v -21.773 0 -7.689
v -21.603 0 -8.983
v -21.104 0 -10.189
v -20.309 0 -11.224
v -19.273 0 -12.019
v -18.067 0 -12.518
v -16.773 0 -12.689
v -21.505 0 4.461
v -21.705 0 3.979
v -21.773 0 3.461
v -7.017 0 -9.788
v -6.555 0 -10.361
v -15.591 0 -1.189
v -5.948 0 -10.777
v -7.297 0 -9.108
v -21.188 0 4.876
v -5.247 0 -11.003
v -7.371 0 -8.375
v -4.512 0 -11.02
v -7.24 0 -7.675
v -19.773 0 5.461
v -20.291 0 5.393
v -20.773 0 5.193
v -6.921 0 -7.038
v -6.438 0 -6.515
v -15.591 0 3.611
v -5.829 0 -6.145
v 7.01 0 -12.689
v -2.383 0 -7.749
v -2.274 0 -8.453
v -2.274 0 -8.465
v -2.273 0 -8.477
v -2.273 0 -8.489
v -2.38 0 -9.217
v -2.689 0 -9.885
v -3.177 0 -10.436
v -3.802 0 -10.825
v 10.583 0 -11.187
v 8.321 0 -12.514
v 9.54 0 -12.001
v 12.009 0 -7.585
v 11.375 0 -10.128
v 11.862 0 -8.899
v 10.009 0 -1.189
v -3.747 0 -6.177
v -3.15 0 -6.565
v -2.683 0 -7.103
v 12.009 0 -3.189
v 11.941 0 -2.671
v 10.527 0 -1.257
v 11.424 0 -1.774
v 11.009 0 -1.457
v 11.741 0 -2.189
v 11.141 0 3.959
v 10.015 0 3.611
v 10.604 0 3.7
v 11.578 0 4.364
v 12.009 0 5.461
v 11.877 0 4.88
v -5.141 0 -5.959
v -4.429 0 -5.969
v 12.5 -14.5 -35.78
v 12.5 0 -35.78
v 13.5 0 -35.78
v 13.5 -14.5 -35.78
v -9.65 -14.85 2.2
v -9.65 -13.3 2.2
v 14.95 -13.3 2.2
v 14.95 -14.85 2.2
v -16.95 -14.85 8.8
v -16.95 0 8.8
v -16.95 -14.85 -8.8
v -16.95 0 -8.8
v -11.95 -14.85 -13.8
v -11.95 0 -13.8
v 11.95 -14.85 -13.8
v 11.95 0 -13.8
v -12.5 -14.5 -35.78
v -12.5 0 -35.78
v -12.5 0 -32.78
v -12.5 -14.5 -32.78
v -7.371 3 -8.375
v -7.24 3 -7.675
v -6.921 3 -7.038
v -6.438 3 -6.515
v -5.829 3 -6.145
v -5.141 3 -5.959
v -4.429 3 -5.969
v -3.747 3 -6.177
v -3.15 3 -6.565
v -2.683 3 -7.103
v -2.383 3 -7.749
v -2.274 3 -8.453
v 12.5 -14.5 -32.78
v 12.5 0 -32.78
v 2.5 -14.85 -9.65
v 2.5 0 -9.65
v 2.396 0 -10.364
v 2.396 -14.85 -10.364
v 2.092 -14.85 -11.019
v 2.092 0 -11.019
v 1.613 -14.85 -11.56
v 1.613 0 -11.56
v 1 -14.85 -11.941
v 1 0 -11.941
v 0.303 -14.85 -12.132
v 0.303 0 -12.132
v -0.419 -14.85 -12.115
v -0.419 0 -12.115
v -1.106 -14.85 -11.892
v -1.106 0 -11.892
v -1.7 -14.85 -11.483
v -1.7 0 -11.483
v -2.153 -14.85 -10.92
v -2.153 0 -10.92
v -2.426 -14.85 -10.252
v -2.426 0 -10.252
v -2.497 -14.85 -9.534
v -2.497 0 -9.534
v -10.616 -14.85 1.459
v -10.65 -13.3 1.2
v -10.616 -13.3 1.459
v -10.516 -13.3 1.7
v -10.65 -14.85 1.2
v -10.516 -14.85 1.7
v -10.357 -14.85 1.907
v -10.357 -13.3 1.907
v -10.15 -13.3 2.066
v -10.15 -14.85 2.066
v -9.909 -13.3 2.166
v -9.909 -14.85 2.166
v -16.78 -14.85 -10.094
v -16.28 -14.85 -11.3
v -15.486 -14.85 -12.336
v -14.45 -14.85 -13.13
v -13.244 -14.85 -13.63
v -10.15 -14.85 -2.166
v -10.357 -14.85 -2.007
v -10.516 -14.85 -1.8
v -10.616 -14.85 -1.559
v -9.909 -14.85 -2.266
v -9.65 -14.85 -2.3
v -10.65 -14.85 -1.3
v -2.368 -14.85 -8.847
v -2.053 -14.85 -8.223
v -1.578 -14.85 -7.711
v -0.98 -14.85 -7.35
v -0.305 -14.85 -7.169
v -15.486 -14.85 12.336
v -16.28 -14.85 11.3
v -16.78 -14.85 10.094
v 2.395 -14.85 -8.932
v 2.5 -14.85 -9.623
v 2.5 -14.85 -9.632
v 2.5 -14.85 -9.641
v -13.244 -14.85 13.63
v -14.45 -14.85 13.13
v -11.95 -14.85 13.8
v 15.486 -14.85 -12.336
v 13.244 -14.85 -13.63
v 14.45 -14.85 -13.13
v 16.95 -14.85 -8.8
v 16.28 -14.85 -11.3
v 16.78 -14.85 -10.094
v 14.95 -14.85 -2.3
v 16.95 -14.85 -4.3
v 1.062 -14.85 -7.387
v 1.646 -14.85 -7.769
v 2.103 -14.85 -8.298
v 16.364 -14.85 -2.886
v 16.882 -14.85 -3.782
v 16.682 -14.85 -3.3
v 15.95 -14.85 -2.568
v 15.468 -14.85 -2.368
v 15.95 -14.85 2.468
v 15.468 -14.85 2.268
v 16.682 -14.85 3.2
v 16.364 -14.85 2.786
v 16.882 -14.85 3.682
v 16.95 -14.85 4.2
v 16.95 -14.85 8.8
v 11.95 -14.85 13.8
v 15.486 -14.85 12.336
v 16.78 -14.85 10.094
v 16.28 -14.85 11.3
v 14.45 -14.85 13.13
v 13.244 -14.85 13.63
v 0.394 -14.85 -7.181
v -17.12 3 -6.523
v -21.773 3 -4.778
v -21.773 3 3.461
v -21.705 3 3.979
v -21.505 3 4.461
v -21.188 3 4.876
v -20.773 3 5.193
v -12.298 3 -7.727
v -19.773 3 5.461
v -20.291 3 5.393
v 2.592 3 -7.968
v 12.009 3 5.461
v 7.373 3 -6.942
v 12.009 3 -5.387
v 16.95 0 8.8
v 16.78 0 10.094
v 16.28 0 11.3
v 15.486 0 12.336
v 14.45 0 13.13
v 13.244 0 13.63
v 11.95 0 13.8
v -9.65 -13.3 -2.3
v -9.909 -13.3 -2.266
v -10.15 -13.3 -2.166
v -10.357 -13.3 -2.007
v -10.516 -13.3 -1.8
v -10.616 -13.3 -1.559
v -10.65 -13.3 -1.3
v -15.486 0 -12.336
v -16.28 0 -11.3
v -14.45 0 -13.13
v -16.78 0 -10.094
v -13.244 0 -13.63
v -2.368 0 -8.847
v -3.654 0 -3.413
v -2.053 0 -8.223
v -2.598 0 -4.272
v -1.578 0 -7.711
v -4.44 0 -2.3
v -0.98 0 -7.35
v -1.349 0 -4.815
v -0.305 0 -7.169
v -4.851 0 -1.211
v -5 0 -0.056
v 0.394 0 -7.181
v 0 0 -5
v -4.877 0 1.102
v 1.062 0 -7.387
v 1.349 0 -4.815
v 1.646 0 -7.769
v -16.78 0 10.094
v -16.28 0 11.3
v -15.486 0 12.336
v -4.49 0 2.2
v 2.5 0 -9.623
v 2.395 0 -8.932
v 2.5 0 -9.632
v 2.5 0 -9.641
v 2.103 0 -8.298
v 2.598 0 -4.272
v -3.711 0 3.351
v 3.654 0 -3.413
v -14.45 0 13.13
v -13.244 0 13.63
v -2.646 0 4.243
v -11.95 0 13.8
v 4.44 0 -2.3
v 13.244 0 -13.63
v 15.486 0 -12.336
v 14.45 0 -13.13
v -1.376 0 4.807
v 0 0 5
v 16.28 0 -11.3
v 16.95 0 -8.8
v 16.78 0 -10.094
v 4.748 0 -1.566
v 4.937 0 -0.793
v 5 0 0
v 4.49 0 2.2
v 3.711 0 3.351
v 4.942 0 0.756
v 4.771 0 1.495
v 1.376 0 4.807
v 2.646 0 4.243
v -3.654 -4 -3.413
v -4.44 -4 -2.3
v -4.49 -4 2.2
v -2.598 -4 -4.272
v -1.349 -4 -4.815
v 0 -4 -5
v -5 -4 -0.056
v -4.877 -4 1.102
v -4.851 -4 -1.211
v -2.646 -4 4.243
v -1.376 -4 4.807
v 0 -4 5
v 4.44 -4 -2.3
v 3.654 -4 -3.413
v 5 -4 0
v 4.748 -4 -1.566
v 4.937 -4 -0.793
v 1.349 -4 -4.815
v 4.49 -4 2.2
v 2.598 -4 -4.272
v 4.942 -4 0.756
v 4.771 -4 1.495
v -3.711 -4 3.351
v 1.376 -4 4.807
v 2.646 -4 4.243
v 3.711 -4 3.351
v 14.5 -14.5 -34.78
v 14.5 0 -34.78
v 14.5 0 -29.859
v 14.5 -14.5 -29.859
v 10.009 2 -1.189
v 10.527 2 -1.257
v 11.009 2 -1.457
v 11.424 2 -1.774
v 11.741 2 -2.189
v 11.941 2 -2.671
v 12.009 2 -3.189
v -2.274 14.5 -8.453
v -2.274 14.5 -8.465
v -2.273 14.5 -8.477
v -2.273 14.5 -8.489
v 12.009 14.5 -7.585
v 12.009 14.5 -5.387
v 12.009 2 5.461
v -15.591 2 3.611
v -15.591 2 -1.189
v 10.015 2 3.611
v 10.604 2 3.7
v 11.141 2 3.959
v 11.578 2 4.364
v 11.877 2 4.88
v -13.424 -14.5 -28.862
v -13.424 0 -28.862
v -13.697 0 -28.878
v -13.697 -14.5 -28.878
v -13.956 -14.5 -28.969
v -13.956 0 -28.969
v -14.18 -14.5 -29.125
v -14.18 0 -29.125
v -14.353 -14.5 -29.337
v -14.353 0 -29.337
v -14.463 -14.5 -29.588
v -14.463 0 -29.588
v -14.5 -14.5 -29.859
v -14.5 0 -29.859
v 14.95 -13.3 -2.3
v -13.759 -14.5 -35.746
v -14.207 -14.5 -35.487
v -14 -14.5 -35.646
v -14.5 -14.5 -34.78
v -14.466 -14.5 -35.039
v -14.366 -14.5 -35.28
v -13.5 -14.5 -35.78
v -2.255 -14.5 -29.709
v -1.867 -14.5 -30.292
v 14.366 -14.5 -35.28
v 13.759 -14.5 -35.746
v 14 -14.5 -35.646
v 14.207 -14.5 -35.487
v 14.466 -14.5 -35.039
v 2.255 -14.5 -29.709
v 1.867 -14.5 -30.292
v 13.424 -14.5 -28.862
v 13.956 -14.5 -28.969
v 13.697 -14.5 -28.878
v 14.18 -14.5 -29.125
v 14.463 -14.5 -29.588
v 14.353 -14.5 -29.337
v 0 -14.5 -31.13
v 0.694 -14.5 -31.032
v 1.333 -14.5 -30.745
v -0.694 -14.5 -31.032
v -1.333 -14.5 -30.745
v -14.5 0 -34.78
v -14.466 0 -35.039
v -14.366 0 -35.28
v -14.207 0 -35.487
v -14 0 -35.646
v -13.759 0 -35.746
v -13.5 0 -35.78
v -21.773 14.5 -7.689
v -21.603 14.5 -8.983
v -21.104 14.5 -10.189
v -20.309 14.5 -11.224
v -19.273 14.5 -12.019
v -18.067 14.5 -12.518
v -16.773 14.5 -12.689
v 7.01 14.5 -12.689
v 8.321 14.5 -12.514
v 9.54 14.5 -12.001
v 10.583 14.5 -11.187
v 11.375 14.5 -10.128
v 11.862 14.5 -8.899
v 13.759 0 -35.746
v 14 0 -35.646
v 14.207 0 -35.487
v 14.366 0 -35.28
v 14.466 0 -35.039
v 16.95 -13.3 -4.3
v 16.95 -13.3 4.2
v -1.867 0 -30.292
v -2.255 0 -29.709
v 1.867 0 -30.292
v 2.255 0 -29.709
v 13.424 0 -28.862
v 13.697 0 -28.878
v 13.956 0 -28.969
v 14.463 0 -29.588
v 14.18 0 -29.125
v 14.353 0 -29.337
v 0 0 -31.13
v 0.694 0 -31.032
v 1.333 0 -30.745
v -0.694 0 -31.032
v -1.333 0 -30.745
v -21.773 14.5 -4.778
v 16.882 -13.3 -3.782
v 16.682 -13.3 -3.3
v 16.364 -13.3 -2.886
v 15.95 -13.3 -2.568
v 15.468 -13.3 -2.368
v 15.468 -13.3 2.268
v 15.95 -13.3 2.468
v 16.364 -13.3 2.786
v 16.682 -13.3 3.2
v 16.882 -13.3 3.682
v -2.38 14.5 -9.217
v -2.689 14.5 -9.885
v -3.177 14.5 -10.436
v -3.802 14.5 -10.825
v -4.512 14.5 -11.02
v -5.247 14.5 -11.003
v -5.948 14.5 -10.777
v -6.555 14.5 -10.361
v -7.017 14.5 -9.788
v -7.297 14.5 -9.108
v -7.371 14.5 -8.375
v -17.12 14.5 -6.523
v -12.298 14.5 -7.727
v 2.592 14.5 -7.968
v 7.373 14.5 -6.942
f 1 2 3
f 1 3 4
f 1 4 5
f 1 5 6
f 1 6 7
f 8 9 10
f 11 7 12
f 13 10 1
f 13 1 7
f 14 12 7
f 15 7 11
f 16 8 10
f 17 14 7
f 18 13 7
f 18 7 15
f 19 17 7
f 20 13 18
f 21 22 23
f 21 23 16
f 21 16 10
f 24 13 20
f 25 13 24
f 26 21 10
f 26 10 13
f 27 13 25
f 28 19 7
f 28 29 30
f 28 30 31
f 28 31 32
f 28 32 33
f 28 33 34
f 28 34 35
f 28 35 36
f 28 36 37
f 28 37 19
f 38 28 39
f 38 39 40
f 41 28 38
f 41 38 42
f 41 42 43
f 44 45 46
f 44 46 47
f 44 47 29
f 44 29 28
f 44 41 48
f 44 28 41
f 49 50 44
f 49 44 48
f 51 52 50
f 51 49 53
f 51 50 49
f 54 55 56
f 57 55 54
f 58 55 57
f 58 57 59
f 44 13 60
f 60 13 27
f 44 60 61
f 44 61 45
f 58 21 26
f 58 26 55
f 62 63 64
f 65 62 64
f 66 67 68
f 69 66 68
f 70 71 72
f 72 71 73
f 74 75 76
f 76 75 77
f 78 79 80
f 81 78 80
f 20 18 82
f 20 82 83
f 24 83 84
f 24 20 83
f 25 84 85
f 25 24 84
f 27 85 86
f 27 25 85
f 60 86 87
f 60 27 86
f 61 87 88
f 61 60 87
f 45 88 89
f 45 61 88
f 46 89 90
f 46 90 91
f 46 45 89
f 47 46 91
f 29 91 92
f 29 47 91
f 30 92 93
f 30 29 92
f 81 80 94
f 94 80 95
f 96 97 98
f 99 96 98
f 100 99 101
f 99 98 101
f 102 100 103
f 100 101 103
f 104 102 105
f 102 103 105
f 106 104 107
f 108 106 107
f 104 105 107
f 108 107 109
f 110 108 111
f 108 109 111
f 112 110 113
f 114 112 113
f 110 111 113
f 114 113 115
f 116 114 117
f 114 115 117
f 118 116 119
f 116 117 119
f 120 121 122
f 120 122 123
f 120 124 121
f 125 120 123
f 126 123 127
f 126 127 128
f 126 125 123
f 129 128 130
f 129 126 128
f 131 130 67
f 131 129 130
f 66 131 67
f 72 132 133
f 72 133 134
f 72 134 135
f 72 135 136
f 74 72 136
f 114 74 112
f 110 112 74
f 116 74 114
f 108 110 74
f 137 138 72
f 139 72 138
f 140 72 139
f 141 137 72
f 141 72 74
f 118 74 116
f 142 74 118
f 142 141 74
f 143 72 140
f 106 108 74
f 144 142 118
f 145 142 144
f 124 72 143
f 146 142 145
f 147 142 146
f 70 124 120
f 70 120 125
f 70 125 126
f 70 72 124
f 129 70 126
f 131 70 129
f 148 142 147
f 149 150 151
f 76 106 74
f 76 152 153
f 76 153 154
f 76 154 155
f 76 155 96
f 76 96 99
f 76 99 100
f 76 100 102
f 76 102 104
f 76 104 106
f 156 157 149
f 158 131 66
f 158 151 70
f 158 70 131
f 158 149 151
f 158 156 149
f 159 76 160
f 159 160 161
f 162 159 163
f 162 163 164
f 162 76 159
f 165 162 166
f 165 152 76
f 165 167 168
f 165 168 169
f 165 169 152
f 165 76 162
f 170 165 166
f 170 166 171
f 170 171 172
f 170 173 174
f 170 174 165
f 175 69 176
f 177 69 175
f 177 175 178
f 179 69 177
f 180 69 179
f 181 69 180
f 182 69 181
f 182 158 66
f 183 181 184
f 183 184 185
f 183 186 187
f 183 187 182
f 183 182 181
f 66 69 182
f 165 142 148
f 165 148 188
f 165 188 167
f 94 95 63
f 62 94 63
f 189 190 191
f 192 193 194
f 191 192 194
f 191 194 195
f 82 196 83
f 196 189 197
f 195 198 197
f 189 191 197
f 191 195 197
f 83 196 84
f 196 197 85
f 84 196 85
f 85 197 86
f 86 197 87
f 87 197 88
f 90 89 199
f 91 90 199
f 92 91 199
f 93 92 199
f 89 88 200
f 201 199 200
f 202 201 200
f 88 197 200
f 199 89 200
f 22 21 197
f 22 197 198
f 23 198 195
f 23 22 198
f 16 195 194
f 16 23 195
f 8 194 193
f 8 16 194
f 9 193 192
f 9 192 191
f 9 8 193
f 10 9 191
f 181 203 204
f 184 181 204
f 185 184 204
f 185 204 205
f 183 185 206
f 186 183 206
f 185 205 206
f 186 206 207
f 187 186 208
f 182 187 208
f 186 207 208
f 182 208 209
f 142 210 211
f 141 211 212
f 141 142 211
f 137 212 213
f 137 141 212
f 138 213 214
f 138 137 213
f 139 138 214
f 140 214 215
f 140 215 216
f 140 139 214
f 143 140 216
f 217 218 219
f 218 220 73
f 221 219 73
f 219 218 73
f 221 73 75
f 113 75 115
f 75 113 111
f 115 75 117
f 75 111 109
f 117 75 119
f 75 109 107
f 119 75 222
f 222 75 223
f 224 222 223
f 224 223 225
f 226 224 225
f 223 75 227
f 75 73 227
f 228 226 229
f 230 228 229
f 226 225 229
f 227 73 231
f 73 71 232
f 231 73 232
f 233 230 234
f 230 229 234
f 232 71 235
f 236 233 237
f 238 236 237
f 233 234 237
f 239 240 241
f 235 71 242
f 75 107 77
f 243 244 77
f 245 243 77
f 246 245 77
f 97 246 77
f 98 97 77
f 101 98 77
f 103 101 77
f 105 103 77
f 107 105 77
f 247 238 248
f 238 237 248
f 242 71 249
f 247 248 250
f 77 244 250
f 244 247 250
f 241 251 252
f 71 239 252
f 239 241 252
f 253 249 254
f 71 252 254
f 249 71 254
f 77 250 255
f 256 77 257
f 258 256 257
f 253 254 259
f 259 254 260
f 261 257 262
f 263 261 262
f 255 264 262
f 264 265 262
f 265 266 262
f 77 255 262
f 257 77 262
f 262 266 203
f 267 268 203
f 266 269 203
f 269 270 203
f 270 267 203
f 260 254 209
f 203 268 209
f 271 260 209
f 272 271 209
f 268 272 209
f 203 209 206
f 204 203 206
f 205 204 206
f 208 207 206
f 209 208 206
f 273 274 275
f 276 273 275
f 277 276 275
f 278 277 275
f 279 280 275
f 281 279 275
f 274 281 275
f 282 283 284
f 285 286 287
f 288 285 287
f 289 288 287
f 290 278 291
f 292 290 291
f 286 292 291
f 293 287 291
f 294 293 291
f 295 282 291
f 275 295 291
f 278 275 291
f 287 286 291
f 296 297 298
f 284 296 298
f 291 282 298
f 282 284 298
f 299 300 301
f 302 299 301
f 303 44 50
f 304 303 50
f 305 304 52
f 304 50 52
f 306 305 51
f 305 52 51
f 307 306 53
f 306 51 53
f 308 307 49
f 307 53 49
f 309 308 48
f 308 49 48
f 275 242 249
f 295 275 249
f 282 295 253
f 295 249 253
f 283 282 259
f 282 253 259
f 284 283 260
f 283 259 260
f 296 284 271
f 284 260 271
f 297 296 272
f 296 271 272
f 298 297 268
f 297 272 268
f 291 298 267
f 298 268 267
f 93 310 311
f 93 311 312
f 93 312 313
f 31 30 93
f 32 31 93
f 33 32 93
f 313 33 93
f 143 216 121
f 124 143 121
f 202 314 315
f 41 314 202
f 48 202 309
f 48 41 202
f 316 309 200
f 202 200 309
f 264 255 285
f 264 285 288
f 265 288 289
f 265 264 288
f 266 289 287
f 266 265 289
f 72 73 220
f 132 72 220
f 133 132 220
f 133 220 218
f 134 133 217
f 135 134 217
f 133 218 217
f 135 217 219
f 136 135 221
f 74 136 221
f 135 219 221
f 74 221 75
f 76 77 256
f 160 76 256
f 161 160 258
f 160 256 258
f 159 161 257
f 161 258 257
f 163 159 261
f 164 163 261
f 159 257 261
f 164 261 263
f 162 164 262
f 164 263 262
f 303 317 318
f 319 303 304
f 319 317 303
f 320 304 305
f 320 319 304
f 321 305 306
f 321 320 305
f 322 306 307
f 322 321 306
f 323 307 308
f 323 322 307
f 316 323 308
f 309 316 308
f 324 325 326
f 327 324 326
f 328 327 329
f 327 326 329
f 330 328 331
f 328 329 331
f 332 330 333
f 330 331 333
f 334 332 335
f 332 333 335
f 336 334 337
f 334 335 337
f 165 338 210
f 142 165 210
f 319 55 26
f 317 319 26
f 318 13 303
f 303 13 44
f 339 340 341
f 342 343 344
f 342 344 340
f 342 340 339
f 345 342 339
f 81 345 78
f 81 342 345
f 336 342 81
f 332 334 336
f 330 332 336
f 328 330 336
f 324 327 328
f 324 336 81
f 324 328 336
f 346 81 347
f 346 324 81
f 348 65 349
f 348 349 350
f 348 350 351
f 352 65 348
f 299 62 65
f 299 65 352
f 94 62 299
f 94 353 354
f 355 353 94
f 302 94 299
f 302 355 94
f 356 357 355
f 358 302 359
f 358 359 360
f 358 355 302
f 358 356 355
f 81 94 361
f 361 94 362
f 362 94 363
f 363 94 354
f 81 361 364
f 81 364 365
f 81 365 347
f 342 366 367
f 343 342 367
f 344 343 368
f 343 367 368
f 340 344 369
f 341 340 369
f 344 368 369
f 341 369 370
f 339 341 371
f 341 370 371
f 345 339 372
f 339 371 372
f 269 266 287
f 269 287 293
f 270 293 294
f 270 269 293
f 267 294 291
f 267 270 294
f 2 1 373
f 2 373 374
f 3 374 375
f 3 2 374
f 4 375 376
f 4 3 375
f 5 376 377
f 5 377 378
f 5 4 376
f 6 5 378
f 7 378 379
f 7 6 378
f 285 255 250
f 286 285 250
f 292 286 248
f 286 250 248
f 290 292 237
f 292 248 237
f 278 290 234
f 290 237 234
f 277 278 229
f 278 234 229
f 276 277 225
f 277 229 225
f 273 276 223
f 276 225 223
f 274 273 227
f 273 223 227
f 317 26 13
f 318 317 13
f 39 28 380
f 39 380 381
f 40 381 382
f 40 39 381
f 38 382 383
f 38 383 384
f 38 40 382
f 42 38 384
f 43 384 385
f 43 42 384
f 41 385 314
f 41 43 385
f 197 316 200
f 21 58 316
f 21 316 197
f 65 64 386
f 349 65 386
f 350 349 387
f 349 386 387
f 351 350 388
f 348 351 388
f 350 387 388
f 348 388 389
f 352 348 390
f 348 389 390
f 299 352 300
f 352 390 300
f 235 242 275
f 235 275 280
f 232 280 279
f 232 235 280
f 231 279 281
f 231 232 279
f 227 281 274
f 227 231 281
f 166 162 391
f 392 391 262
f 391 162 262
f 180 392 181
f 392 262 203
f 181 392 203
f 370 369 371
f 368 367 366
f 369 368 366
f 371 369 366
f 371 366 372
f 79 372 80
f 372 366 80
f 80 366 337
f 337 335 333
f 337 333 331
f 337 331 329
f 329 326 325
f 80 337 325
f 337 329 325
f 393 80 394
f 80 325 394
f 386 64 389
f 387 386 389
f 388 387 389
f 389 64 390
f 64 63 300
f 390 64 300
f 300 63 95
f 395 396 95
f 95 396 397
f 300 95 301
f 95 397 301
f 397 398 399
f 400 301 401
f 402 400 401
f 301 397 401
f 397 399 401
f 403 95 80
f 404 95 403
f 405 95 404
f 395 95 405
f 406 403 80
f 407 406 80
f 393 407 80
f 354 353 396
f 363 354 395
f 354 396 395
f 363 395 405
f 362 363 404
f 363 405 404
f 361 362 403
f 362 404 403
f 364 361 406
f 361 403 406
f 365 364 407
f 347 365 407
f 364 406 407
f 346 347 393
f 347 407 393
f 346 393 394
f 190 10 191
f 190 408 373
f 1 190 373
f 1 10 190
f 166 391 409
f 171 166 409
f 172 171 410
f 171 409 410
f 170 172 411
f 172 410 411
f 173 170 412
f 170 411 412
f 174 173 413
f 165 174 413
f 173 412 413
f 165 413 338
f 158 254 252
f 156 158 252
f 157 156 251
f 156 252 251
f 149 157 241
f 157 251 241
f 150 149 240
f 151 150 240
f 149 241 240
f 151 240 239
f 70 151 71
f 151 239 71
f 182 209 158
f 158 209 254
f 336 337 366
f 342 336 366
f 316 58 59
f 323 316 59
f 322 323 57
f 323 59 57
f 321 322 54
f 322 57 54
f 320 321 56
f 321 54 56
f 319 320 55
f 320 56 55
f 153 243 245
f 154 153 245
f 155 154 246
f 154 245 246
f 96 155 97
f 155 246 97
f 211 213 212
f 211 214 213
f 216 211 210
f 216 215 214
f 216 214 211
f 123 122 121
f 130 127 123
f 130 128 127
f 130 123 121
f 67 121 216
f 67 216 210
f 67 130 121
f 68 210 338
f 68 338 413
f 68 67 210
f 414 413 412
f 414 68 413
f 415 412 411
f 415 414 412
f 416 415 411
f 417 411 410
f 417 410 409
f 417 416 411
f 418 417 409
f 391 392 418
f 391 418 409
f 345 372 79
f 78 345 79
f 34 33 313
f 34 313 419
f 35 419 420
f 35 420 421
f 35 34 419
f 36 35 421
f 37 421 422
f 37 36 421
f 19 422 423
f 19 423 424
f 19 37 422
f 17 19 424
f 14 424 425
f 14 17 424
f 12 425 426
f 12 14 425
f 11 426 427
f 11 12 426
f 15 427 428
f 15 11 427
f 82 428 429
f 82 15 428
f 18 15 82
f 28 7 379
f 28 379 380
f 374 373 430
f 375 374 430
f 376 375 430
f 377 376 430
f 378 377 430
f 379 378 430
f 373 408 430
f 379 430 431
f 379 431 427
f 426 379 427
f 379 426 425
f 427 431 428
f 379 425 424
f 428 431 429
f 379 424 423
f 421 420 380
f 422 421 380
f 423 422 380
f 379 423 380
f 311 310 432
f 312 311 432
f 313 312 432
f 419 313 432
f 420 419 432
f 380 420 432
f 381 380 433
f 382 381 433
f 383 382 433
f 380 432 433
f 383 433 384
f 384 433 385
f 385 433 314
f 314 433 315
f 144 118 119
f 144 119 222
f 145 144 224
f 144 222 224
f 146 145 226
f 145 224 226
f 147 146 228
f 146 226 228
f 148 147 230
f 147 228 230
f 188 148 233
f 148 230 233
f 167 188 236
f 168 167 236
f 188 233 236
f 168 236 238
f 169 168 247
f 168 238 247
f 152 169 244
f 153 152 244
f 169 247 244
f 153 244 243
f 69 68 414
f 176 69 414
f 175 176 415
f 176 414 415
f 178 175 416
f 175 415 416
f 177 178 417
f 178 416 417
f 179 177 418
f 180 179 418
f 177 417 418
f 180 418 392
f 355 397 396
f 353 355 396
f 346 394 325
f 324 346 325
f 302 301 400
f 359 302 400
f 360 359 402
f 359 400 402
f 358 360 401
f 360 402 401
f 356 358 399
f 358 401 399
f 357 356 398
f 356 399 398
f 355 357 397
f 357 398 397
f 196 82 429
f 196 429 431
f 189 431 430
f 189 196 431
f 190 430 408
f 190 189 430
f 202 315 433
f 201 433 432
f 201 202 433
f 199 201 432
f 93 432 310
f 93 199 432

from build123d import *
from build123d import SkipClean  # not in build123d's __all__

# Parameters (mm, degrees)
F1_DEPTH  = 14.85
F2_DEPTH  = 13.3
F3_START  = 4
F3_DEPTH  = 9.3
F4_DEPTH  = 4
F5_START  = 4
F5_DEPTH  = 10.85
F6_R      = 1
F8_DEPTH  = 14.5
F9_DEPTH  = 3
F10_DEPTH = 2
F12_DEPTH = 14.5


with BuildPart() as f1:
    # F0 (on Front) → F1 (new body)
    with BuildSketch(Plane.XZ):
        with BuildLine():
            Line((11.95, 13.8), (-11.95, 13.8))
            ThreePointArc((-11.95, 13.8), (-15.4855339059, 12.3355339059), (-16.95, 8.8))
            Line((-16.95, 8.8), (-16.95, -5.8895261027))
            ThreePointArc((-16.95, -5.8895261027), (-9.8804541895, -8.3334638669), (-2.4972846772, -9.5335129141))
            ThreePointArc((-2.4972846772, -9.5335129141), (0.0448690015, -7.1504026779), (2.4998564985, -9.6232140564))
            ThreePointArc((2.4998564985, -9.6232140564), (9.8559923461, -8.7028657635), (16.95, -6.55))
            Line((16.95, -6.55), (16.95, -4.3))
            ThreePointArc((16.95, -4.3), (16.3642135624, -2.8857864376), (14.95, -2.3))
            Line((14.95, -2.3), (4.4395945761, -2.3))
            ThreePointArc((4.4395945761, -2.3), (0, -5), (-4.4395945761, -2.3))
            Line((-4.4395945761, -2.3), (-10.65, -2.3))
            Line((-10.65, -2.3), (-10.65, 2.2))
            Line((-10.65, 2.2), (-4.4899888641, 2.2))
            ThreePointArc((-4.4899888641, 2.2), (0, 5), (4.4899888641, 2.2))
            Line((4.4899888641, 2.2), (14.95, 2.2))
            ThreePointArc((14.95, 2.2), (16.3642135624, 2.7857864376), (16.95, 4.2))
            Line((16.95, 4.2), (16.95, 8.8))
            ThreePointArc((16.95, 8.8), (15.4855339059, 12.3355339059), (11.95, 13.8))
        make_face()
        with BuildLine():
            ThreePointArc((-2.4972846772, -9.5335129141), (-9.8804541895, -8.3334638669), (-16.95, -5.8895261027))
            Line((-16.95, -5.8895261027), (-16.95, -8.8))
            ThreePointArc((-16.95, -8.8), (-15.4855339059, -12.3355339059), (-11.95, -13.8))
            Line((-11.95, -13.8), (11.95, -13.8))
            ThreePointArc((11.95, -13.8), (15.4855339059, -12.3355339059), (16.95, -8.8))
            Line((16.95, -8.8), (16.95, -6.55))
            ThreePointArc((16.95, -6.55), (9.8559923461, -8.7028657635), (2.4998564985, -9.6232140564))
            ThreePointArc((2.4998564985, -9.6232140564), (2.4999641244, -9.636606836), (2.5, -9.65))
            ThreePointArc((2.5, -9.65), (-0.0582593644, -12.1493210771), (-2.4972846772, -9.5335129141))
        make_face()
    extrude(amount=F1_DEPTH)

    # F0 (on Front) → F2 (join)
    with BuildSketch(Plane.XZ):
        with BuildLine():
            ThreePointArc((-4.4395945761, -2.3), (-4.9996865006, -0.0559901426), (-4.4899888641, 2.2))
            Line((-4.4899888641, 2.2), (-10.65, 2.2))
            Line((-10.65, 2.2), (-10.65, -2.3))
            Line((-10.65, -2.3), (-4.4395945761, -2.3))
        make_face()
        with BuildLine():
            ThreePointArc((5, 0), (4.8708286934, 1.1291713066), (4.4899888641, 2.2))
            Line((4.4899888641, 2.2), (-4.4899888641, 2.2))
            ThreePointArc((-4.4899888641, 2.2), (-4.9996865006, -0.0559901426), (-4.4395945761, -2.3))
            Line((-4.4395945761, -2.3), (4.4395945761, -2.3))
            ThreePointArc((4.4395945761, -2.3), (4.8578788005, -1.1836441863), (5, 0))
        make_face()
        with BuildLine():
            Line((16.95, 2.2), (16.95, 4.2))
            ThreePointArc((16.95, 4.2), (16.3642135624, 2.7857864376), (14.95, 2.2))
            Line((14.95, 2.2), (4.4899888641, 2.2))
            ThreePointArc((4.4899888641, 2.2), (4.8708286934, 1.1291713066), (5, 0))
            ThreePointArc((5, 0), (4.8578788005, -1.1836441863), (4.4395945761, -2.3))
            Line((4.4395945761, -2.3), (14.95, -2.3))
            ThreePointArc((14.95, -2.3), (16.3642135624, -2.8857864376), (16.95, -4.3))
            Line((16.95, -4.3), (16.95, -2.3))
            Line((16.95, -2.3), (16.95, 2.2))
        make_face()
    extrude(amount=F2_DEPTH)

    # F0 (on Front) → F3 (join)
    with BuildSketch(Plane.XZ.offset(F3_START)):
        with BuildLine():
            Line((-4.4899888641, 2.2), (4.4899888641, 2.2))
            ThreePointArc((4.4899888641, 2.2), (0, 5), (-4.4899888641, 2.2))
        make_face()
        with BuildLine():
            Line((4.4395945761, -2.3), (-4.4395945761, -2.3))
            ThreePointArc((-4.4395945761, -2.3), (0, -5), (4.4395945761, -2.3))
        make_face()
        with BuildLine():
            ThreePointArc((5, 0), (4.8708286934, 1.1291713066), (4.4899888641, 2.2))
            Line((4.4899888641, 2.2), (-4.4899888641, 2.2))
            ThreePointArc((-4.4899888641, 2.2), (-4.9996865006, -0.0559901426), (-4.4395945761, -2.3))
            Line((-4.4395945761, -2.3), (4.4395945761, -2.3))
            ThreePointArc((4.4395945761, -2.3), (4.8578788005, -1.1836441863), (5, 0))
        make_face()
    extrude(amount=F3_DEPTH)

    # F0 (on Front) → F4 (cut)
    with BuildSketch(Plane.XZ):
        with BuildLine():
            ThreePointArc((5, 0), (4.8708286934, 1.1291713066), (4.4899888641, 2.2))
            Line((4.4899888641, 2.2), (-4.4899888641, 2.2))
            ThreePointArc((-4.4899888641, 2.2), (-4.9996865006, -0.0559901426), (-4.4395945761, -2.3))
            Line((-4.4395945761, -2.3), (4.4395945761, -2.3))
            ThreePointArc((4.4395945761, -2.3), (4.8578788005, -1.1836441863), (5, 0))
        make_face()
    with SkipClean():  # cleaning this boolean's faces spoils the solid; the shape is the same uncleaned
        extrude(amount=F4_DEPTH, mode=Mode.SUBTRACT)

    # F0 (on Front) → F5 (join)
    with BuildSketch(Plane.XZ.offset(F5_START)):
        with BuildLine():
            Line((-4.4899888641, 2.2), (4.4899888641, 2.2))
            ThreePointArc((4.4899888641, 2.2), (0, 5), (-4.4899888641, 2.2))
        make_face()
        with BuildLine():
            Line((4.4395945761, -2.3), (-4.4395945761, -2.3))
            ThreePointArc((-4.4395945761, -2.3), (0, -5), (4.4395945761, -2.3))
        make_face()
    with SkipClean():  # cleaning this boolean's faces spoils the solid; the shape is the same uncleaned
        extrude(amount=F5_DEPTH)

    # F6
    f6_edges = [f1.edges().sort_by_distance(p)[0] for p in [
        (-10.65, -14.075, 2.2),
        (-10.65, -14.075, -2.3),
    ]]
    fillet(f6_edges, radius=F6_R)


with BuildPart() as f8:
    # F7 (on Front) → F8 (new body)
    with BuildSketch(Plane.XZ):
        with BuildLine():
            ThreePointArc((-21.773402003, -7.6886942186), (-20.308935909, -11.2242281245), (-16.773402003, -12.6886942186))
            Line((-16.773402003, -12.6886942186), (7.0104826284, -12.6886942186))
            ThreePointArc((7.0104826284, -12.6886942186), (10.5825591861, -11.187303809), (12.0094031494, -7.584801845))
            Line((12.0094031494, -7.584801845), (12.0094031494, -5.3867480318))
            ThreePointArc((12.0094031494, -5.3867480318), (4.9971655581, -7.5221412361), (-2.2736510197, -8.4530582387))
            ThreePointArc((-2.2736510197, -8.4530582387), (-2.273464258, -8.4708757937), (-2.273402003, -8.4886942186))
            ThreePointArc((-2.273402003, -8.4886942186), (-4.8801320097, -11.0380631025), (-7.3708778511, -8.3752622863))
            ThreePointArc((-7.3708778511, -8.3752622863), (-14.7262981055, -7.1939892841), (-21.773402003, -4.7782203213))
            Line((-21.773402003, -4.7782203213), (-21.773402003, -7.6886942186))
        make_face()
    extrude(amount=-F8_DEPTH)

    # F7 (on Front) → F9 (join)
    with BuildSketch(Plane.XZ):
        with BuildLine():
            Line((-21.773402003, 3.4613057814), (-21.773402003, -4.7782203213))
            ThreePointArc((-21.773402003, -4.7782203213), (-14.7262981055, -7.1939892841), (-7.3708778511, -8.3752622863))
            ThreePointArc((-7.3708778511, -8.3752622863), (-4.7844873963, -5.9389911666), (-2.2736510197, -8.4530582387))
            ThreePointArc((-2.2736510197, -8.4530582387), (4.9971655581, -7.5221412361), (12.0094031494, -5.3867480318))
            Line((12.0094031494, -5.3867480318), (12.0094031494, -3.1886942186))
            ThreePointArc((12.0094031494, -3.1886942186), (11.4236167118, -1.7744806562), (10.0094031494, -1.1886942186))
            Line((10.0094031494, -1.1886942186), (-15.5905968506, -1.1886942186))
            Line((-15.5905968506, -1.1886942186), (-15.5905968506, 3.6113057814))
            Line((-15.5905968506, 3.6113057814), (10.0150360819, 3.6113057814))
            ThreePointArc((10.0150360819, 3.6113057814), (11.3751831327, 4.1450179515), (12.0094031494, 5.4613057814))
            Line((12.0094031494, 5.4613057814), (-19.773402003, 5.4613057814))
            ThreePointArc((-19.773402003, 5.4613057814), (-21.1876155654, 4.8755193438), (-21.773402003, 3.4613057814))
        make_face()
        with BuildLine():
            ThreePointArc((10.0094031494, -1.1886942186), (11.4236167118, -1.7744806562), (12.0094031494, -3.1886942186))
            Line((12.0094031494, -3.1886942186), (12.0094031494, -1.1886942186))
            Line((12.0094031494, -1.1886942186), (12.0094031494, 3.3113057814))
            Line((12.0094031494, 3.3113057814), (12.0094031494, 5.4613057814))
            ThreePointArc((12.0094031494, 5.4613057814), (11.3751831327, 4.1450179515), (10.0150360819, 3.6113057814))
            Line((10.0150360819, 3.6113057814), (-15.5905968506, 3.6113057814))
            Line((-15.5905968506, 3.6113057814), (-15.5905968506, -1.1886942186))
            Line((-15.5905968506, -1.1886942186), (10.0094031494, -1.1886942186))
        make_face()
    extrude(amount=-F9_DEPTH)

    # F7 (on Front) → F10 (cut)
    with BuildSketch(Plane.XZ):
        with BuildLine():
            ThreePointArc((10.0094031494, -1.1886942186), (11.4236167118, -1.7744806562), (12.0094031494, -3.1886942186))
            Line((12.0094031494, -3.1886942186), (12.0094031494, -1.1886942186))
            Line((12.0094031494, -1.1886942186), (12.0094031494, 3.3113057814))
            Line((12.0094031494, 3.3113057814), (12.0094031494, 5.4613057814))
            ThreePointArc((12.0094031494, 5.4613057814), (11.3751831327, 4.1450179515), (10.0150360819, 3.6113057814))
            Line((10.0150360819, 3.6113057814), (-15.5905968506, 3.6113057814))
            Line((-15.5905968506, 3.6113057814), (-15.5905968506, -1.1886942186))
            Line((-15.5905968506, -1.1886942186), (10.0094031494, -1.1886942186))
        make_face()
    extrude(amount=-F10_DEPTH, mode=Mode.SUBTRACT)


with BuildPart() as f12:
    # F11 (on Front) → F12 (new body)
    with BuildSketch(Plane.XZ):
        with BuildLine():
            Line((-12.5, -32.7800722122), (0, -32.7800722122))
            Line((0, -32.7800722122), (12.5, -32.7800722122))
            Line((12.5, -32.7800722122), (12.5, -35.7800722122))
            Line((12.5, -35.7800722122), (13.5, -35.7800722122))
            ThreePointArc((13.5, -35.7800722122), (14.2071067812, -35.4871789934), (14.5, -34.7800722122))
            Line((14.5, -34.7800722122), (14.5, -29.8588076797))
            ThreePointArc((14.5, -29.8588076797), (14.1798364834, -29.1254439529), (13.4243552884, -28.8616728455))
            Line((13.4243552884, -28.8616728455), (2.255203111, -29.7089878383))
            ThreePointArc((2.255203111, -29.7089878383), (0, -31.1300722122), (-2.255203111, -29.7089878383))
            Line((-2.255203111, -29.7089878383), (-13.4243552884, -28.8616728455))
            ThreePointArc((-13.4243552884, -28.8616728455), (-14.1798364834, -29.1254439529), (-14.5, -29.8588076797))
            Line((-14.5, -29.8588076797), (-14.5, -34.7800722122))
            ThreePointArc((-14.5, -34.7800722122), (-14.2071067812, -35.4871789934), (-13.5, -35.7800722122))
            Line((-13.5, -35.7800722122), (-12.5, -35.7800722122))
            Line((-12.5, -35.7800722122), (-12.5, -32.7800722122))
        make_face()
    extrude(amount=F12_DEPTH)


solid = Compound([f1.part, f8.part, f12.part])
